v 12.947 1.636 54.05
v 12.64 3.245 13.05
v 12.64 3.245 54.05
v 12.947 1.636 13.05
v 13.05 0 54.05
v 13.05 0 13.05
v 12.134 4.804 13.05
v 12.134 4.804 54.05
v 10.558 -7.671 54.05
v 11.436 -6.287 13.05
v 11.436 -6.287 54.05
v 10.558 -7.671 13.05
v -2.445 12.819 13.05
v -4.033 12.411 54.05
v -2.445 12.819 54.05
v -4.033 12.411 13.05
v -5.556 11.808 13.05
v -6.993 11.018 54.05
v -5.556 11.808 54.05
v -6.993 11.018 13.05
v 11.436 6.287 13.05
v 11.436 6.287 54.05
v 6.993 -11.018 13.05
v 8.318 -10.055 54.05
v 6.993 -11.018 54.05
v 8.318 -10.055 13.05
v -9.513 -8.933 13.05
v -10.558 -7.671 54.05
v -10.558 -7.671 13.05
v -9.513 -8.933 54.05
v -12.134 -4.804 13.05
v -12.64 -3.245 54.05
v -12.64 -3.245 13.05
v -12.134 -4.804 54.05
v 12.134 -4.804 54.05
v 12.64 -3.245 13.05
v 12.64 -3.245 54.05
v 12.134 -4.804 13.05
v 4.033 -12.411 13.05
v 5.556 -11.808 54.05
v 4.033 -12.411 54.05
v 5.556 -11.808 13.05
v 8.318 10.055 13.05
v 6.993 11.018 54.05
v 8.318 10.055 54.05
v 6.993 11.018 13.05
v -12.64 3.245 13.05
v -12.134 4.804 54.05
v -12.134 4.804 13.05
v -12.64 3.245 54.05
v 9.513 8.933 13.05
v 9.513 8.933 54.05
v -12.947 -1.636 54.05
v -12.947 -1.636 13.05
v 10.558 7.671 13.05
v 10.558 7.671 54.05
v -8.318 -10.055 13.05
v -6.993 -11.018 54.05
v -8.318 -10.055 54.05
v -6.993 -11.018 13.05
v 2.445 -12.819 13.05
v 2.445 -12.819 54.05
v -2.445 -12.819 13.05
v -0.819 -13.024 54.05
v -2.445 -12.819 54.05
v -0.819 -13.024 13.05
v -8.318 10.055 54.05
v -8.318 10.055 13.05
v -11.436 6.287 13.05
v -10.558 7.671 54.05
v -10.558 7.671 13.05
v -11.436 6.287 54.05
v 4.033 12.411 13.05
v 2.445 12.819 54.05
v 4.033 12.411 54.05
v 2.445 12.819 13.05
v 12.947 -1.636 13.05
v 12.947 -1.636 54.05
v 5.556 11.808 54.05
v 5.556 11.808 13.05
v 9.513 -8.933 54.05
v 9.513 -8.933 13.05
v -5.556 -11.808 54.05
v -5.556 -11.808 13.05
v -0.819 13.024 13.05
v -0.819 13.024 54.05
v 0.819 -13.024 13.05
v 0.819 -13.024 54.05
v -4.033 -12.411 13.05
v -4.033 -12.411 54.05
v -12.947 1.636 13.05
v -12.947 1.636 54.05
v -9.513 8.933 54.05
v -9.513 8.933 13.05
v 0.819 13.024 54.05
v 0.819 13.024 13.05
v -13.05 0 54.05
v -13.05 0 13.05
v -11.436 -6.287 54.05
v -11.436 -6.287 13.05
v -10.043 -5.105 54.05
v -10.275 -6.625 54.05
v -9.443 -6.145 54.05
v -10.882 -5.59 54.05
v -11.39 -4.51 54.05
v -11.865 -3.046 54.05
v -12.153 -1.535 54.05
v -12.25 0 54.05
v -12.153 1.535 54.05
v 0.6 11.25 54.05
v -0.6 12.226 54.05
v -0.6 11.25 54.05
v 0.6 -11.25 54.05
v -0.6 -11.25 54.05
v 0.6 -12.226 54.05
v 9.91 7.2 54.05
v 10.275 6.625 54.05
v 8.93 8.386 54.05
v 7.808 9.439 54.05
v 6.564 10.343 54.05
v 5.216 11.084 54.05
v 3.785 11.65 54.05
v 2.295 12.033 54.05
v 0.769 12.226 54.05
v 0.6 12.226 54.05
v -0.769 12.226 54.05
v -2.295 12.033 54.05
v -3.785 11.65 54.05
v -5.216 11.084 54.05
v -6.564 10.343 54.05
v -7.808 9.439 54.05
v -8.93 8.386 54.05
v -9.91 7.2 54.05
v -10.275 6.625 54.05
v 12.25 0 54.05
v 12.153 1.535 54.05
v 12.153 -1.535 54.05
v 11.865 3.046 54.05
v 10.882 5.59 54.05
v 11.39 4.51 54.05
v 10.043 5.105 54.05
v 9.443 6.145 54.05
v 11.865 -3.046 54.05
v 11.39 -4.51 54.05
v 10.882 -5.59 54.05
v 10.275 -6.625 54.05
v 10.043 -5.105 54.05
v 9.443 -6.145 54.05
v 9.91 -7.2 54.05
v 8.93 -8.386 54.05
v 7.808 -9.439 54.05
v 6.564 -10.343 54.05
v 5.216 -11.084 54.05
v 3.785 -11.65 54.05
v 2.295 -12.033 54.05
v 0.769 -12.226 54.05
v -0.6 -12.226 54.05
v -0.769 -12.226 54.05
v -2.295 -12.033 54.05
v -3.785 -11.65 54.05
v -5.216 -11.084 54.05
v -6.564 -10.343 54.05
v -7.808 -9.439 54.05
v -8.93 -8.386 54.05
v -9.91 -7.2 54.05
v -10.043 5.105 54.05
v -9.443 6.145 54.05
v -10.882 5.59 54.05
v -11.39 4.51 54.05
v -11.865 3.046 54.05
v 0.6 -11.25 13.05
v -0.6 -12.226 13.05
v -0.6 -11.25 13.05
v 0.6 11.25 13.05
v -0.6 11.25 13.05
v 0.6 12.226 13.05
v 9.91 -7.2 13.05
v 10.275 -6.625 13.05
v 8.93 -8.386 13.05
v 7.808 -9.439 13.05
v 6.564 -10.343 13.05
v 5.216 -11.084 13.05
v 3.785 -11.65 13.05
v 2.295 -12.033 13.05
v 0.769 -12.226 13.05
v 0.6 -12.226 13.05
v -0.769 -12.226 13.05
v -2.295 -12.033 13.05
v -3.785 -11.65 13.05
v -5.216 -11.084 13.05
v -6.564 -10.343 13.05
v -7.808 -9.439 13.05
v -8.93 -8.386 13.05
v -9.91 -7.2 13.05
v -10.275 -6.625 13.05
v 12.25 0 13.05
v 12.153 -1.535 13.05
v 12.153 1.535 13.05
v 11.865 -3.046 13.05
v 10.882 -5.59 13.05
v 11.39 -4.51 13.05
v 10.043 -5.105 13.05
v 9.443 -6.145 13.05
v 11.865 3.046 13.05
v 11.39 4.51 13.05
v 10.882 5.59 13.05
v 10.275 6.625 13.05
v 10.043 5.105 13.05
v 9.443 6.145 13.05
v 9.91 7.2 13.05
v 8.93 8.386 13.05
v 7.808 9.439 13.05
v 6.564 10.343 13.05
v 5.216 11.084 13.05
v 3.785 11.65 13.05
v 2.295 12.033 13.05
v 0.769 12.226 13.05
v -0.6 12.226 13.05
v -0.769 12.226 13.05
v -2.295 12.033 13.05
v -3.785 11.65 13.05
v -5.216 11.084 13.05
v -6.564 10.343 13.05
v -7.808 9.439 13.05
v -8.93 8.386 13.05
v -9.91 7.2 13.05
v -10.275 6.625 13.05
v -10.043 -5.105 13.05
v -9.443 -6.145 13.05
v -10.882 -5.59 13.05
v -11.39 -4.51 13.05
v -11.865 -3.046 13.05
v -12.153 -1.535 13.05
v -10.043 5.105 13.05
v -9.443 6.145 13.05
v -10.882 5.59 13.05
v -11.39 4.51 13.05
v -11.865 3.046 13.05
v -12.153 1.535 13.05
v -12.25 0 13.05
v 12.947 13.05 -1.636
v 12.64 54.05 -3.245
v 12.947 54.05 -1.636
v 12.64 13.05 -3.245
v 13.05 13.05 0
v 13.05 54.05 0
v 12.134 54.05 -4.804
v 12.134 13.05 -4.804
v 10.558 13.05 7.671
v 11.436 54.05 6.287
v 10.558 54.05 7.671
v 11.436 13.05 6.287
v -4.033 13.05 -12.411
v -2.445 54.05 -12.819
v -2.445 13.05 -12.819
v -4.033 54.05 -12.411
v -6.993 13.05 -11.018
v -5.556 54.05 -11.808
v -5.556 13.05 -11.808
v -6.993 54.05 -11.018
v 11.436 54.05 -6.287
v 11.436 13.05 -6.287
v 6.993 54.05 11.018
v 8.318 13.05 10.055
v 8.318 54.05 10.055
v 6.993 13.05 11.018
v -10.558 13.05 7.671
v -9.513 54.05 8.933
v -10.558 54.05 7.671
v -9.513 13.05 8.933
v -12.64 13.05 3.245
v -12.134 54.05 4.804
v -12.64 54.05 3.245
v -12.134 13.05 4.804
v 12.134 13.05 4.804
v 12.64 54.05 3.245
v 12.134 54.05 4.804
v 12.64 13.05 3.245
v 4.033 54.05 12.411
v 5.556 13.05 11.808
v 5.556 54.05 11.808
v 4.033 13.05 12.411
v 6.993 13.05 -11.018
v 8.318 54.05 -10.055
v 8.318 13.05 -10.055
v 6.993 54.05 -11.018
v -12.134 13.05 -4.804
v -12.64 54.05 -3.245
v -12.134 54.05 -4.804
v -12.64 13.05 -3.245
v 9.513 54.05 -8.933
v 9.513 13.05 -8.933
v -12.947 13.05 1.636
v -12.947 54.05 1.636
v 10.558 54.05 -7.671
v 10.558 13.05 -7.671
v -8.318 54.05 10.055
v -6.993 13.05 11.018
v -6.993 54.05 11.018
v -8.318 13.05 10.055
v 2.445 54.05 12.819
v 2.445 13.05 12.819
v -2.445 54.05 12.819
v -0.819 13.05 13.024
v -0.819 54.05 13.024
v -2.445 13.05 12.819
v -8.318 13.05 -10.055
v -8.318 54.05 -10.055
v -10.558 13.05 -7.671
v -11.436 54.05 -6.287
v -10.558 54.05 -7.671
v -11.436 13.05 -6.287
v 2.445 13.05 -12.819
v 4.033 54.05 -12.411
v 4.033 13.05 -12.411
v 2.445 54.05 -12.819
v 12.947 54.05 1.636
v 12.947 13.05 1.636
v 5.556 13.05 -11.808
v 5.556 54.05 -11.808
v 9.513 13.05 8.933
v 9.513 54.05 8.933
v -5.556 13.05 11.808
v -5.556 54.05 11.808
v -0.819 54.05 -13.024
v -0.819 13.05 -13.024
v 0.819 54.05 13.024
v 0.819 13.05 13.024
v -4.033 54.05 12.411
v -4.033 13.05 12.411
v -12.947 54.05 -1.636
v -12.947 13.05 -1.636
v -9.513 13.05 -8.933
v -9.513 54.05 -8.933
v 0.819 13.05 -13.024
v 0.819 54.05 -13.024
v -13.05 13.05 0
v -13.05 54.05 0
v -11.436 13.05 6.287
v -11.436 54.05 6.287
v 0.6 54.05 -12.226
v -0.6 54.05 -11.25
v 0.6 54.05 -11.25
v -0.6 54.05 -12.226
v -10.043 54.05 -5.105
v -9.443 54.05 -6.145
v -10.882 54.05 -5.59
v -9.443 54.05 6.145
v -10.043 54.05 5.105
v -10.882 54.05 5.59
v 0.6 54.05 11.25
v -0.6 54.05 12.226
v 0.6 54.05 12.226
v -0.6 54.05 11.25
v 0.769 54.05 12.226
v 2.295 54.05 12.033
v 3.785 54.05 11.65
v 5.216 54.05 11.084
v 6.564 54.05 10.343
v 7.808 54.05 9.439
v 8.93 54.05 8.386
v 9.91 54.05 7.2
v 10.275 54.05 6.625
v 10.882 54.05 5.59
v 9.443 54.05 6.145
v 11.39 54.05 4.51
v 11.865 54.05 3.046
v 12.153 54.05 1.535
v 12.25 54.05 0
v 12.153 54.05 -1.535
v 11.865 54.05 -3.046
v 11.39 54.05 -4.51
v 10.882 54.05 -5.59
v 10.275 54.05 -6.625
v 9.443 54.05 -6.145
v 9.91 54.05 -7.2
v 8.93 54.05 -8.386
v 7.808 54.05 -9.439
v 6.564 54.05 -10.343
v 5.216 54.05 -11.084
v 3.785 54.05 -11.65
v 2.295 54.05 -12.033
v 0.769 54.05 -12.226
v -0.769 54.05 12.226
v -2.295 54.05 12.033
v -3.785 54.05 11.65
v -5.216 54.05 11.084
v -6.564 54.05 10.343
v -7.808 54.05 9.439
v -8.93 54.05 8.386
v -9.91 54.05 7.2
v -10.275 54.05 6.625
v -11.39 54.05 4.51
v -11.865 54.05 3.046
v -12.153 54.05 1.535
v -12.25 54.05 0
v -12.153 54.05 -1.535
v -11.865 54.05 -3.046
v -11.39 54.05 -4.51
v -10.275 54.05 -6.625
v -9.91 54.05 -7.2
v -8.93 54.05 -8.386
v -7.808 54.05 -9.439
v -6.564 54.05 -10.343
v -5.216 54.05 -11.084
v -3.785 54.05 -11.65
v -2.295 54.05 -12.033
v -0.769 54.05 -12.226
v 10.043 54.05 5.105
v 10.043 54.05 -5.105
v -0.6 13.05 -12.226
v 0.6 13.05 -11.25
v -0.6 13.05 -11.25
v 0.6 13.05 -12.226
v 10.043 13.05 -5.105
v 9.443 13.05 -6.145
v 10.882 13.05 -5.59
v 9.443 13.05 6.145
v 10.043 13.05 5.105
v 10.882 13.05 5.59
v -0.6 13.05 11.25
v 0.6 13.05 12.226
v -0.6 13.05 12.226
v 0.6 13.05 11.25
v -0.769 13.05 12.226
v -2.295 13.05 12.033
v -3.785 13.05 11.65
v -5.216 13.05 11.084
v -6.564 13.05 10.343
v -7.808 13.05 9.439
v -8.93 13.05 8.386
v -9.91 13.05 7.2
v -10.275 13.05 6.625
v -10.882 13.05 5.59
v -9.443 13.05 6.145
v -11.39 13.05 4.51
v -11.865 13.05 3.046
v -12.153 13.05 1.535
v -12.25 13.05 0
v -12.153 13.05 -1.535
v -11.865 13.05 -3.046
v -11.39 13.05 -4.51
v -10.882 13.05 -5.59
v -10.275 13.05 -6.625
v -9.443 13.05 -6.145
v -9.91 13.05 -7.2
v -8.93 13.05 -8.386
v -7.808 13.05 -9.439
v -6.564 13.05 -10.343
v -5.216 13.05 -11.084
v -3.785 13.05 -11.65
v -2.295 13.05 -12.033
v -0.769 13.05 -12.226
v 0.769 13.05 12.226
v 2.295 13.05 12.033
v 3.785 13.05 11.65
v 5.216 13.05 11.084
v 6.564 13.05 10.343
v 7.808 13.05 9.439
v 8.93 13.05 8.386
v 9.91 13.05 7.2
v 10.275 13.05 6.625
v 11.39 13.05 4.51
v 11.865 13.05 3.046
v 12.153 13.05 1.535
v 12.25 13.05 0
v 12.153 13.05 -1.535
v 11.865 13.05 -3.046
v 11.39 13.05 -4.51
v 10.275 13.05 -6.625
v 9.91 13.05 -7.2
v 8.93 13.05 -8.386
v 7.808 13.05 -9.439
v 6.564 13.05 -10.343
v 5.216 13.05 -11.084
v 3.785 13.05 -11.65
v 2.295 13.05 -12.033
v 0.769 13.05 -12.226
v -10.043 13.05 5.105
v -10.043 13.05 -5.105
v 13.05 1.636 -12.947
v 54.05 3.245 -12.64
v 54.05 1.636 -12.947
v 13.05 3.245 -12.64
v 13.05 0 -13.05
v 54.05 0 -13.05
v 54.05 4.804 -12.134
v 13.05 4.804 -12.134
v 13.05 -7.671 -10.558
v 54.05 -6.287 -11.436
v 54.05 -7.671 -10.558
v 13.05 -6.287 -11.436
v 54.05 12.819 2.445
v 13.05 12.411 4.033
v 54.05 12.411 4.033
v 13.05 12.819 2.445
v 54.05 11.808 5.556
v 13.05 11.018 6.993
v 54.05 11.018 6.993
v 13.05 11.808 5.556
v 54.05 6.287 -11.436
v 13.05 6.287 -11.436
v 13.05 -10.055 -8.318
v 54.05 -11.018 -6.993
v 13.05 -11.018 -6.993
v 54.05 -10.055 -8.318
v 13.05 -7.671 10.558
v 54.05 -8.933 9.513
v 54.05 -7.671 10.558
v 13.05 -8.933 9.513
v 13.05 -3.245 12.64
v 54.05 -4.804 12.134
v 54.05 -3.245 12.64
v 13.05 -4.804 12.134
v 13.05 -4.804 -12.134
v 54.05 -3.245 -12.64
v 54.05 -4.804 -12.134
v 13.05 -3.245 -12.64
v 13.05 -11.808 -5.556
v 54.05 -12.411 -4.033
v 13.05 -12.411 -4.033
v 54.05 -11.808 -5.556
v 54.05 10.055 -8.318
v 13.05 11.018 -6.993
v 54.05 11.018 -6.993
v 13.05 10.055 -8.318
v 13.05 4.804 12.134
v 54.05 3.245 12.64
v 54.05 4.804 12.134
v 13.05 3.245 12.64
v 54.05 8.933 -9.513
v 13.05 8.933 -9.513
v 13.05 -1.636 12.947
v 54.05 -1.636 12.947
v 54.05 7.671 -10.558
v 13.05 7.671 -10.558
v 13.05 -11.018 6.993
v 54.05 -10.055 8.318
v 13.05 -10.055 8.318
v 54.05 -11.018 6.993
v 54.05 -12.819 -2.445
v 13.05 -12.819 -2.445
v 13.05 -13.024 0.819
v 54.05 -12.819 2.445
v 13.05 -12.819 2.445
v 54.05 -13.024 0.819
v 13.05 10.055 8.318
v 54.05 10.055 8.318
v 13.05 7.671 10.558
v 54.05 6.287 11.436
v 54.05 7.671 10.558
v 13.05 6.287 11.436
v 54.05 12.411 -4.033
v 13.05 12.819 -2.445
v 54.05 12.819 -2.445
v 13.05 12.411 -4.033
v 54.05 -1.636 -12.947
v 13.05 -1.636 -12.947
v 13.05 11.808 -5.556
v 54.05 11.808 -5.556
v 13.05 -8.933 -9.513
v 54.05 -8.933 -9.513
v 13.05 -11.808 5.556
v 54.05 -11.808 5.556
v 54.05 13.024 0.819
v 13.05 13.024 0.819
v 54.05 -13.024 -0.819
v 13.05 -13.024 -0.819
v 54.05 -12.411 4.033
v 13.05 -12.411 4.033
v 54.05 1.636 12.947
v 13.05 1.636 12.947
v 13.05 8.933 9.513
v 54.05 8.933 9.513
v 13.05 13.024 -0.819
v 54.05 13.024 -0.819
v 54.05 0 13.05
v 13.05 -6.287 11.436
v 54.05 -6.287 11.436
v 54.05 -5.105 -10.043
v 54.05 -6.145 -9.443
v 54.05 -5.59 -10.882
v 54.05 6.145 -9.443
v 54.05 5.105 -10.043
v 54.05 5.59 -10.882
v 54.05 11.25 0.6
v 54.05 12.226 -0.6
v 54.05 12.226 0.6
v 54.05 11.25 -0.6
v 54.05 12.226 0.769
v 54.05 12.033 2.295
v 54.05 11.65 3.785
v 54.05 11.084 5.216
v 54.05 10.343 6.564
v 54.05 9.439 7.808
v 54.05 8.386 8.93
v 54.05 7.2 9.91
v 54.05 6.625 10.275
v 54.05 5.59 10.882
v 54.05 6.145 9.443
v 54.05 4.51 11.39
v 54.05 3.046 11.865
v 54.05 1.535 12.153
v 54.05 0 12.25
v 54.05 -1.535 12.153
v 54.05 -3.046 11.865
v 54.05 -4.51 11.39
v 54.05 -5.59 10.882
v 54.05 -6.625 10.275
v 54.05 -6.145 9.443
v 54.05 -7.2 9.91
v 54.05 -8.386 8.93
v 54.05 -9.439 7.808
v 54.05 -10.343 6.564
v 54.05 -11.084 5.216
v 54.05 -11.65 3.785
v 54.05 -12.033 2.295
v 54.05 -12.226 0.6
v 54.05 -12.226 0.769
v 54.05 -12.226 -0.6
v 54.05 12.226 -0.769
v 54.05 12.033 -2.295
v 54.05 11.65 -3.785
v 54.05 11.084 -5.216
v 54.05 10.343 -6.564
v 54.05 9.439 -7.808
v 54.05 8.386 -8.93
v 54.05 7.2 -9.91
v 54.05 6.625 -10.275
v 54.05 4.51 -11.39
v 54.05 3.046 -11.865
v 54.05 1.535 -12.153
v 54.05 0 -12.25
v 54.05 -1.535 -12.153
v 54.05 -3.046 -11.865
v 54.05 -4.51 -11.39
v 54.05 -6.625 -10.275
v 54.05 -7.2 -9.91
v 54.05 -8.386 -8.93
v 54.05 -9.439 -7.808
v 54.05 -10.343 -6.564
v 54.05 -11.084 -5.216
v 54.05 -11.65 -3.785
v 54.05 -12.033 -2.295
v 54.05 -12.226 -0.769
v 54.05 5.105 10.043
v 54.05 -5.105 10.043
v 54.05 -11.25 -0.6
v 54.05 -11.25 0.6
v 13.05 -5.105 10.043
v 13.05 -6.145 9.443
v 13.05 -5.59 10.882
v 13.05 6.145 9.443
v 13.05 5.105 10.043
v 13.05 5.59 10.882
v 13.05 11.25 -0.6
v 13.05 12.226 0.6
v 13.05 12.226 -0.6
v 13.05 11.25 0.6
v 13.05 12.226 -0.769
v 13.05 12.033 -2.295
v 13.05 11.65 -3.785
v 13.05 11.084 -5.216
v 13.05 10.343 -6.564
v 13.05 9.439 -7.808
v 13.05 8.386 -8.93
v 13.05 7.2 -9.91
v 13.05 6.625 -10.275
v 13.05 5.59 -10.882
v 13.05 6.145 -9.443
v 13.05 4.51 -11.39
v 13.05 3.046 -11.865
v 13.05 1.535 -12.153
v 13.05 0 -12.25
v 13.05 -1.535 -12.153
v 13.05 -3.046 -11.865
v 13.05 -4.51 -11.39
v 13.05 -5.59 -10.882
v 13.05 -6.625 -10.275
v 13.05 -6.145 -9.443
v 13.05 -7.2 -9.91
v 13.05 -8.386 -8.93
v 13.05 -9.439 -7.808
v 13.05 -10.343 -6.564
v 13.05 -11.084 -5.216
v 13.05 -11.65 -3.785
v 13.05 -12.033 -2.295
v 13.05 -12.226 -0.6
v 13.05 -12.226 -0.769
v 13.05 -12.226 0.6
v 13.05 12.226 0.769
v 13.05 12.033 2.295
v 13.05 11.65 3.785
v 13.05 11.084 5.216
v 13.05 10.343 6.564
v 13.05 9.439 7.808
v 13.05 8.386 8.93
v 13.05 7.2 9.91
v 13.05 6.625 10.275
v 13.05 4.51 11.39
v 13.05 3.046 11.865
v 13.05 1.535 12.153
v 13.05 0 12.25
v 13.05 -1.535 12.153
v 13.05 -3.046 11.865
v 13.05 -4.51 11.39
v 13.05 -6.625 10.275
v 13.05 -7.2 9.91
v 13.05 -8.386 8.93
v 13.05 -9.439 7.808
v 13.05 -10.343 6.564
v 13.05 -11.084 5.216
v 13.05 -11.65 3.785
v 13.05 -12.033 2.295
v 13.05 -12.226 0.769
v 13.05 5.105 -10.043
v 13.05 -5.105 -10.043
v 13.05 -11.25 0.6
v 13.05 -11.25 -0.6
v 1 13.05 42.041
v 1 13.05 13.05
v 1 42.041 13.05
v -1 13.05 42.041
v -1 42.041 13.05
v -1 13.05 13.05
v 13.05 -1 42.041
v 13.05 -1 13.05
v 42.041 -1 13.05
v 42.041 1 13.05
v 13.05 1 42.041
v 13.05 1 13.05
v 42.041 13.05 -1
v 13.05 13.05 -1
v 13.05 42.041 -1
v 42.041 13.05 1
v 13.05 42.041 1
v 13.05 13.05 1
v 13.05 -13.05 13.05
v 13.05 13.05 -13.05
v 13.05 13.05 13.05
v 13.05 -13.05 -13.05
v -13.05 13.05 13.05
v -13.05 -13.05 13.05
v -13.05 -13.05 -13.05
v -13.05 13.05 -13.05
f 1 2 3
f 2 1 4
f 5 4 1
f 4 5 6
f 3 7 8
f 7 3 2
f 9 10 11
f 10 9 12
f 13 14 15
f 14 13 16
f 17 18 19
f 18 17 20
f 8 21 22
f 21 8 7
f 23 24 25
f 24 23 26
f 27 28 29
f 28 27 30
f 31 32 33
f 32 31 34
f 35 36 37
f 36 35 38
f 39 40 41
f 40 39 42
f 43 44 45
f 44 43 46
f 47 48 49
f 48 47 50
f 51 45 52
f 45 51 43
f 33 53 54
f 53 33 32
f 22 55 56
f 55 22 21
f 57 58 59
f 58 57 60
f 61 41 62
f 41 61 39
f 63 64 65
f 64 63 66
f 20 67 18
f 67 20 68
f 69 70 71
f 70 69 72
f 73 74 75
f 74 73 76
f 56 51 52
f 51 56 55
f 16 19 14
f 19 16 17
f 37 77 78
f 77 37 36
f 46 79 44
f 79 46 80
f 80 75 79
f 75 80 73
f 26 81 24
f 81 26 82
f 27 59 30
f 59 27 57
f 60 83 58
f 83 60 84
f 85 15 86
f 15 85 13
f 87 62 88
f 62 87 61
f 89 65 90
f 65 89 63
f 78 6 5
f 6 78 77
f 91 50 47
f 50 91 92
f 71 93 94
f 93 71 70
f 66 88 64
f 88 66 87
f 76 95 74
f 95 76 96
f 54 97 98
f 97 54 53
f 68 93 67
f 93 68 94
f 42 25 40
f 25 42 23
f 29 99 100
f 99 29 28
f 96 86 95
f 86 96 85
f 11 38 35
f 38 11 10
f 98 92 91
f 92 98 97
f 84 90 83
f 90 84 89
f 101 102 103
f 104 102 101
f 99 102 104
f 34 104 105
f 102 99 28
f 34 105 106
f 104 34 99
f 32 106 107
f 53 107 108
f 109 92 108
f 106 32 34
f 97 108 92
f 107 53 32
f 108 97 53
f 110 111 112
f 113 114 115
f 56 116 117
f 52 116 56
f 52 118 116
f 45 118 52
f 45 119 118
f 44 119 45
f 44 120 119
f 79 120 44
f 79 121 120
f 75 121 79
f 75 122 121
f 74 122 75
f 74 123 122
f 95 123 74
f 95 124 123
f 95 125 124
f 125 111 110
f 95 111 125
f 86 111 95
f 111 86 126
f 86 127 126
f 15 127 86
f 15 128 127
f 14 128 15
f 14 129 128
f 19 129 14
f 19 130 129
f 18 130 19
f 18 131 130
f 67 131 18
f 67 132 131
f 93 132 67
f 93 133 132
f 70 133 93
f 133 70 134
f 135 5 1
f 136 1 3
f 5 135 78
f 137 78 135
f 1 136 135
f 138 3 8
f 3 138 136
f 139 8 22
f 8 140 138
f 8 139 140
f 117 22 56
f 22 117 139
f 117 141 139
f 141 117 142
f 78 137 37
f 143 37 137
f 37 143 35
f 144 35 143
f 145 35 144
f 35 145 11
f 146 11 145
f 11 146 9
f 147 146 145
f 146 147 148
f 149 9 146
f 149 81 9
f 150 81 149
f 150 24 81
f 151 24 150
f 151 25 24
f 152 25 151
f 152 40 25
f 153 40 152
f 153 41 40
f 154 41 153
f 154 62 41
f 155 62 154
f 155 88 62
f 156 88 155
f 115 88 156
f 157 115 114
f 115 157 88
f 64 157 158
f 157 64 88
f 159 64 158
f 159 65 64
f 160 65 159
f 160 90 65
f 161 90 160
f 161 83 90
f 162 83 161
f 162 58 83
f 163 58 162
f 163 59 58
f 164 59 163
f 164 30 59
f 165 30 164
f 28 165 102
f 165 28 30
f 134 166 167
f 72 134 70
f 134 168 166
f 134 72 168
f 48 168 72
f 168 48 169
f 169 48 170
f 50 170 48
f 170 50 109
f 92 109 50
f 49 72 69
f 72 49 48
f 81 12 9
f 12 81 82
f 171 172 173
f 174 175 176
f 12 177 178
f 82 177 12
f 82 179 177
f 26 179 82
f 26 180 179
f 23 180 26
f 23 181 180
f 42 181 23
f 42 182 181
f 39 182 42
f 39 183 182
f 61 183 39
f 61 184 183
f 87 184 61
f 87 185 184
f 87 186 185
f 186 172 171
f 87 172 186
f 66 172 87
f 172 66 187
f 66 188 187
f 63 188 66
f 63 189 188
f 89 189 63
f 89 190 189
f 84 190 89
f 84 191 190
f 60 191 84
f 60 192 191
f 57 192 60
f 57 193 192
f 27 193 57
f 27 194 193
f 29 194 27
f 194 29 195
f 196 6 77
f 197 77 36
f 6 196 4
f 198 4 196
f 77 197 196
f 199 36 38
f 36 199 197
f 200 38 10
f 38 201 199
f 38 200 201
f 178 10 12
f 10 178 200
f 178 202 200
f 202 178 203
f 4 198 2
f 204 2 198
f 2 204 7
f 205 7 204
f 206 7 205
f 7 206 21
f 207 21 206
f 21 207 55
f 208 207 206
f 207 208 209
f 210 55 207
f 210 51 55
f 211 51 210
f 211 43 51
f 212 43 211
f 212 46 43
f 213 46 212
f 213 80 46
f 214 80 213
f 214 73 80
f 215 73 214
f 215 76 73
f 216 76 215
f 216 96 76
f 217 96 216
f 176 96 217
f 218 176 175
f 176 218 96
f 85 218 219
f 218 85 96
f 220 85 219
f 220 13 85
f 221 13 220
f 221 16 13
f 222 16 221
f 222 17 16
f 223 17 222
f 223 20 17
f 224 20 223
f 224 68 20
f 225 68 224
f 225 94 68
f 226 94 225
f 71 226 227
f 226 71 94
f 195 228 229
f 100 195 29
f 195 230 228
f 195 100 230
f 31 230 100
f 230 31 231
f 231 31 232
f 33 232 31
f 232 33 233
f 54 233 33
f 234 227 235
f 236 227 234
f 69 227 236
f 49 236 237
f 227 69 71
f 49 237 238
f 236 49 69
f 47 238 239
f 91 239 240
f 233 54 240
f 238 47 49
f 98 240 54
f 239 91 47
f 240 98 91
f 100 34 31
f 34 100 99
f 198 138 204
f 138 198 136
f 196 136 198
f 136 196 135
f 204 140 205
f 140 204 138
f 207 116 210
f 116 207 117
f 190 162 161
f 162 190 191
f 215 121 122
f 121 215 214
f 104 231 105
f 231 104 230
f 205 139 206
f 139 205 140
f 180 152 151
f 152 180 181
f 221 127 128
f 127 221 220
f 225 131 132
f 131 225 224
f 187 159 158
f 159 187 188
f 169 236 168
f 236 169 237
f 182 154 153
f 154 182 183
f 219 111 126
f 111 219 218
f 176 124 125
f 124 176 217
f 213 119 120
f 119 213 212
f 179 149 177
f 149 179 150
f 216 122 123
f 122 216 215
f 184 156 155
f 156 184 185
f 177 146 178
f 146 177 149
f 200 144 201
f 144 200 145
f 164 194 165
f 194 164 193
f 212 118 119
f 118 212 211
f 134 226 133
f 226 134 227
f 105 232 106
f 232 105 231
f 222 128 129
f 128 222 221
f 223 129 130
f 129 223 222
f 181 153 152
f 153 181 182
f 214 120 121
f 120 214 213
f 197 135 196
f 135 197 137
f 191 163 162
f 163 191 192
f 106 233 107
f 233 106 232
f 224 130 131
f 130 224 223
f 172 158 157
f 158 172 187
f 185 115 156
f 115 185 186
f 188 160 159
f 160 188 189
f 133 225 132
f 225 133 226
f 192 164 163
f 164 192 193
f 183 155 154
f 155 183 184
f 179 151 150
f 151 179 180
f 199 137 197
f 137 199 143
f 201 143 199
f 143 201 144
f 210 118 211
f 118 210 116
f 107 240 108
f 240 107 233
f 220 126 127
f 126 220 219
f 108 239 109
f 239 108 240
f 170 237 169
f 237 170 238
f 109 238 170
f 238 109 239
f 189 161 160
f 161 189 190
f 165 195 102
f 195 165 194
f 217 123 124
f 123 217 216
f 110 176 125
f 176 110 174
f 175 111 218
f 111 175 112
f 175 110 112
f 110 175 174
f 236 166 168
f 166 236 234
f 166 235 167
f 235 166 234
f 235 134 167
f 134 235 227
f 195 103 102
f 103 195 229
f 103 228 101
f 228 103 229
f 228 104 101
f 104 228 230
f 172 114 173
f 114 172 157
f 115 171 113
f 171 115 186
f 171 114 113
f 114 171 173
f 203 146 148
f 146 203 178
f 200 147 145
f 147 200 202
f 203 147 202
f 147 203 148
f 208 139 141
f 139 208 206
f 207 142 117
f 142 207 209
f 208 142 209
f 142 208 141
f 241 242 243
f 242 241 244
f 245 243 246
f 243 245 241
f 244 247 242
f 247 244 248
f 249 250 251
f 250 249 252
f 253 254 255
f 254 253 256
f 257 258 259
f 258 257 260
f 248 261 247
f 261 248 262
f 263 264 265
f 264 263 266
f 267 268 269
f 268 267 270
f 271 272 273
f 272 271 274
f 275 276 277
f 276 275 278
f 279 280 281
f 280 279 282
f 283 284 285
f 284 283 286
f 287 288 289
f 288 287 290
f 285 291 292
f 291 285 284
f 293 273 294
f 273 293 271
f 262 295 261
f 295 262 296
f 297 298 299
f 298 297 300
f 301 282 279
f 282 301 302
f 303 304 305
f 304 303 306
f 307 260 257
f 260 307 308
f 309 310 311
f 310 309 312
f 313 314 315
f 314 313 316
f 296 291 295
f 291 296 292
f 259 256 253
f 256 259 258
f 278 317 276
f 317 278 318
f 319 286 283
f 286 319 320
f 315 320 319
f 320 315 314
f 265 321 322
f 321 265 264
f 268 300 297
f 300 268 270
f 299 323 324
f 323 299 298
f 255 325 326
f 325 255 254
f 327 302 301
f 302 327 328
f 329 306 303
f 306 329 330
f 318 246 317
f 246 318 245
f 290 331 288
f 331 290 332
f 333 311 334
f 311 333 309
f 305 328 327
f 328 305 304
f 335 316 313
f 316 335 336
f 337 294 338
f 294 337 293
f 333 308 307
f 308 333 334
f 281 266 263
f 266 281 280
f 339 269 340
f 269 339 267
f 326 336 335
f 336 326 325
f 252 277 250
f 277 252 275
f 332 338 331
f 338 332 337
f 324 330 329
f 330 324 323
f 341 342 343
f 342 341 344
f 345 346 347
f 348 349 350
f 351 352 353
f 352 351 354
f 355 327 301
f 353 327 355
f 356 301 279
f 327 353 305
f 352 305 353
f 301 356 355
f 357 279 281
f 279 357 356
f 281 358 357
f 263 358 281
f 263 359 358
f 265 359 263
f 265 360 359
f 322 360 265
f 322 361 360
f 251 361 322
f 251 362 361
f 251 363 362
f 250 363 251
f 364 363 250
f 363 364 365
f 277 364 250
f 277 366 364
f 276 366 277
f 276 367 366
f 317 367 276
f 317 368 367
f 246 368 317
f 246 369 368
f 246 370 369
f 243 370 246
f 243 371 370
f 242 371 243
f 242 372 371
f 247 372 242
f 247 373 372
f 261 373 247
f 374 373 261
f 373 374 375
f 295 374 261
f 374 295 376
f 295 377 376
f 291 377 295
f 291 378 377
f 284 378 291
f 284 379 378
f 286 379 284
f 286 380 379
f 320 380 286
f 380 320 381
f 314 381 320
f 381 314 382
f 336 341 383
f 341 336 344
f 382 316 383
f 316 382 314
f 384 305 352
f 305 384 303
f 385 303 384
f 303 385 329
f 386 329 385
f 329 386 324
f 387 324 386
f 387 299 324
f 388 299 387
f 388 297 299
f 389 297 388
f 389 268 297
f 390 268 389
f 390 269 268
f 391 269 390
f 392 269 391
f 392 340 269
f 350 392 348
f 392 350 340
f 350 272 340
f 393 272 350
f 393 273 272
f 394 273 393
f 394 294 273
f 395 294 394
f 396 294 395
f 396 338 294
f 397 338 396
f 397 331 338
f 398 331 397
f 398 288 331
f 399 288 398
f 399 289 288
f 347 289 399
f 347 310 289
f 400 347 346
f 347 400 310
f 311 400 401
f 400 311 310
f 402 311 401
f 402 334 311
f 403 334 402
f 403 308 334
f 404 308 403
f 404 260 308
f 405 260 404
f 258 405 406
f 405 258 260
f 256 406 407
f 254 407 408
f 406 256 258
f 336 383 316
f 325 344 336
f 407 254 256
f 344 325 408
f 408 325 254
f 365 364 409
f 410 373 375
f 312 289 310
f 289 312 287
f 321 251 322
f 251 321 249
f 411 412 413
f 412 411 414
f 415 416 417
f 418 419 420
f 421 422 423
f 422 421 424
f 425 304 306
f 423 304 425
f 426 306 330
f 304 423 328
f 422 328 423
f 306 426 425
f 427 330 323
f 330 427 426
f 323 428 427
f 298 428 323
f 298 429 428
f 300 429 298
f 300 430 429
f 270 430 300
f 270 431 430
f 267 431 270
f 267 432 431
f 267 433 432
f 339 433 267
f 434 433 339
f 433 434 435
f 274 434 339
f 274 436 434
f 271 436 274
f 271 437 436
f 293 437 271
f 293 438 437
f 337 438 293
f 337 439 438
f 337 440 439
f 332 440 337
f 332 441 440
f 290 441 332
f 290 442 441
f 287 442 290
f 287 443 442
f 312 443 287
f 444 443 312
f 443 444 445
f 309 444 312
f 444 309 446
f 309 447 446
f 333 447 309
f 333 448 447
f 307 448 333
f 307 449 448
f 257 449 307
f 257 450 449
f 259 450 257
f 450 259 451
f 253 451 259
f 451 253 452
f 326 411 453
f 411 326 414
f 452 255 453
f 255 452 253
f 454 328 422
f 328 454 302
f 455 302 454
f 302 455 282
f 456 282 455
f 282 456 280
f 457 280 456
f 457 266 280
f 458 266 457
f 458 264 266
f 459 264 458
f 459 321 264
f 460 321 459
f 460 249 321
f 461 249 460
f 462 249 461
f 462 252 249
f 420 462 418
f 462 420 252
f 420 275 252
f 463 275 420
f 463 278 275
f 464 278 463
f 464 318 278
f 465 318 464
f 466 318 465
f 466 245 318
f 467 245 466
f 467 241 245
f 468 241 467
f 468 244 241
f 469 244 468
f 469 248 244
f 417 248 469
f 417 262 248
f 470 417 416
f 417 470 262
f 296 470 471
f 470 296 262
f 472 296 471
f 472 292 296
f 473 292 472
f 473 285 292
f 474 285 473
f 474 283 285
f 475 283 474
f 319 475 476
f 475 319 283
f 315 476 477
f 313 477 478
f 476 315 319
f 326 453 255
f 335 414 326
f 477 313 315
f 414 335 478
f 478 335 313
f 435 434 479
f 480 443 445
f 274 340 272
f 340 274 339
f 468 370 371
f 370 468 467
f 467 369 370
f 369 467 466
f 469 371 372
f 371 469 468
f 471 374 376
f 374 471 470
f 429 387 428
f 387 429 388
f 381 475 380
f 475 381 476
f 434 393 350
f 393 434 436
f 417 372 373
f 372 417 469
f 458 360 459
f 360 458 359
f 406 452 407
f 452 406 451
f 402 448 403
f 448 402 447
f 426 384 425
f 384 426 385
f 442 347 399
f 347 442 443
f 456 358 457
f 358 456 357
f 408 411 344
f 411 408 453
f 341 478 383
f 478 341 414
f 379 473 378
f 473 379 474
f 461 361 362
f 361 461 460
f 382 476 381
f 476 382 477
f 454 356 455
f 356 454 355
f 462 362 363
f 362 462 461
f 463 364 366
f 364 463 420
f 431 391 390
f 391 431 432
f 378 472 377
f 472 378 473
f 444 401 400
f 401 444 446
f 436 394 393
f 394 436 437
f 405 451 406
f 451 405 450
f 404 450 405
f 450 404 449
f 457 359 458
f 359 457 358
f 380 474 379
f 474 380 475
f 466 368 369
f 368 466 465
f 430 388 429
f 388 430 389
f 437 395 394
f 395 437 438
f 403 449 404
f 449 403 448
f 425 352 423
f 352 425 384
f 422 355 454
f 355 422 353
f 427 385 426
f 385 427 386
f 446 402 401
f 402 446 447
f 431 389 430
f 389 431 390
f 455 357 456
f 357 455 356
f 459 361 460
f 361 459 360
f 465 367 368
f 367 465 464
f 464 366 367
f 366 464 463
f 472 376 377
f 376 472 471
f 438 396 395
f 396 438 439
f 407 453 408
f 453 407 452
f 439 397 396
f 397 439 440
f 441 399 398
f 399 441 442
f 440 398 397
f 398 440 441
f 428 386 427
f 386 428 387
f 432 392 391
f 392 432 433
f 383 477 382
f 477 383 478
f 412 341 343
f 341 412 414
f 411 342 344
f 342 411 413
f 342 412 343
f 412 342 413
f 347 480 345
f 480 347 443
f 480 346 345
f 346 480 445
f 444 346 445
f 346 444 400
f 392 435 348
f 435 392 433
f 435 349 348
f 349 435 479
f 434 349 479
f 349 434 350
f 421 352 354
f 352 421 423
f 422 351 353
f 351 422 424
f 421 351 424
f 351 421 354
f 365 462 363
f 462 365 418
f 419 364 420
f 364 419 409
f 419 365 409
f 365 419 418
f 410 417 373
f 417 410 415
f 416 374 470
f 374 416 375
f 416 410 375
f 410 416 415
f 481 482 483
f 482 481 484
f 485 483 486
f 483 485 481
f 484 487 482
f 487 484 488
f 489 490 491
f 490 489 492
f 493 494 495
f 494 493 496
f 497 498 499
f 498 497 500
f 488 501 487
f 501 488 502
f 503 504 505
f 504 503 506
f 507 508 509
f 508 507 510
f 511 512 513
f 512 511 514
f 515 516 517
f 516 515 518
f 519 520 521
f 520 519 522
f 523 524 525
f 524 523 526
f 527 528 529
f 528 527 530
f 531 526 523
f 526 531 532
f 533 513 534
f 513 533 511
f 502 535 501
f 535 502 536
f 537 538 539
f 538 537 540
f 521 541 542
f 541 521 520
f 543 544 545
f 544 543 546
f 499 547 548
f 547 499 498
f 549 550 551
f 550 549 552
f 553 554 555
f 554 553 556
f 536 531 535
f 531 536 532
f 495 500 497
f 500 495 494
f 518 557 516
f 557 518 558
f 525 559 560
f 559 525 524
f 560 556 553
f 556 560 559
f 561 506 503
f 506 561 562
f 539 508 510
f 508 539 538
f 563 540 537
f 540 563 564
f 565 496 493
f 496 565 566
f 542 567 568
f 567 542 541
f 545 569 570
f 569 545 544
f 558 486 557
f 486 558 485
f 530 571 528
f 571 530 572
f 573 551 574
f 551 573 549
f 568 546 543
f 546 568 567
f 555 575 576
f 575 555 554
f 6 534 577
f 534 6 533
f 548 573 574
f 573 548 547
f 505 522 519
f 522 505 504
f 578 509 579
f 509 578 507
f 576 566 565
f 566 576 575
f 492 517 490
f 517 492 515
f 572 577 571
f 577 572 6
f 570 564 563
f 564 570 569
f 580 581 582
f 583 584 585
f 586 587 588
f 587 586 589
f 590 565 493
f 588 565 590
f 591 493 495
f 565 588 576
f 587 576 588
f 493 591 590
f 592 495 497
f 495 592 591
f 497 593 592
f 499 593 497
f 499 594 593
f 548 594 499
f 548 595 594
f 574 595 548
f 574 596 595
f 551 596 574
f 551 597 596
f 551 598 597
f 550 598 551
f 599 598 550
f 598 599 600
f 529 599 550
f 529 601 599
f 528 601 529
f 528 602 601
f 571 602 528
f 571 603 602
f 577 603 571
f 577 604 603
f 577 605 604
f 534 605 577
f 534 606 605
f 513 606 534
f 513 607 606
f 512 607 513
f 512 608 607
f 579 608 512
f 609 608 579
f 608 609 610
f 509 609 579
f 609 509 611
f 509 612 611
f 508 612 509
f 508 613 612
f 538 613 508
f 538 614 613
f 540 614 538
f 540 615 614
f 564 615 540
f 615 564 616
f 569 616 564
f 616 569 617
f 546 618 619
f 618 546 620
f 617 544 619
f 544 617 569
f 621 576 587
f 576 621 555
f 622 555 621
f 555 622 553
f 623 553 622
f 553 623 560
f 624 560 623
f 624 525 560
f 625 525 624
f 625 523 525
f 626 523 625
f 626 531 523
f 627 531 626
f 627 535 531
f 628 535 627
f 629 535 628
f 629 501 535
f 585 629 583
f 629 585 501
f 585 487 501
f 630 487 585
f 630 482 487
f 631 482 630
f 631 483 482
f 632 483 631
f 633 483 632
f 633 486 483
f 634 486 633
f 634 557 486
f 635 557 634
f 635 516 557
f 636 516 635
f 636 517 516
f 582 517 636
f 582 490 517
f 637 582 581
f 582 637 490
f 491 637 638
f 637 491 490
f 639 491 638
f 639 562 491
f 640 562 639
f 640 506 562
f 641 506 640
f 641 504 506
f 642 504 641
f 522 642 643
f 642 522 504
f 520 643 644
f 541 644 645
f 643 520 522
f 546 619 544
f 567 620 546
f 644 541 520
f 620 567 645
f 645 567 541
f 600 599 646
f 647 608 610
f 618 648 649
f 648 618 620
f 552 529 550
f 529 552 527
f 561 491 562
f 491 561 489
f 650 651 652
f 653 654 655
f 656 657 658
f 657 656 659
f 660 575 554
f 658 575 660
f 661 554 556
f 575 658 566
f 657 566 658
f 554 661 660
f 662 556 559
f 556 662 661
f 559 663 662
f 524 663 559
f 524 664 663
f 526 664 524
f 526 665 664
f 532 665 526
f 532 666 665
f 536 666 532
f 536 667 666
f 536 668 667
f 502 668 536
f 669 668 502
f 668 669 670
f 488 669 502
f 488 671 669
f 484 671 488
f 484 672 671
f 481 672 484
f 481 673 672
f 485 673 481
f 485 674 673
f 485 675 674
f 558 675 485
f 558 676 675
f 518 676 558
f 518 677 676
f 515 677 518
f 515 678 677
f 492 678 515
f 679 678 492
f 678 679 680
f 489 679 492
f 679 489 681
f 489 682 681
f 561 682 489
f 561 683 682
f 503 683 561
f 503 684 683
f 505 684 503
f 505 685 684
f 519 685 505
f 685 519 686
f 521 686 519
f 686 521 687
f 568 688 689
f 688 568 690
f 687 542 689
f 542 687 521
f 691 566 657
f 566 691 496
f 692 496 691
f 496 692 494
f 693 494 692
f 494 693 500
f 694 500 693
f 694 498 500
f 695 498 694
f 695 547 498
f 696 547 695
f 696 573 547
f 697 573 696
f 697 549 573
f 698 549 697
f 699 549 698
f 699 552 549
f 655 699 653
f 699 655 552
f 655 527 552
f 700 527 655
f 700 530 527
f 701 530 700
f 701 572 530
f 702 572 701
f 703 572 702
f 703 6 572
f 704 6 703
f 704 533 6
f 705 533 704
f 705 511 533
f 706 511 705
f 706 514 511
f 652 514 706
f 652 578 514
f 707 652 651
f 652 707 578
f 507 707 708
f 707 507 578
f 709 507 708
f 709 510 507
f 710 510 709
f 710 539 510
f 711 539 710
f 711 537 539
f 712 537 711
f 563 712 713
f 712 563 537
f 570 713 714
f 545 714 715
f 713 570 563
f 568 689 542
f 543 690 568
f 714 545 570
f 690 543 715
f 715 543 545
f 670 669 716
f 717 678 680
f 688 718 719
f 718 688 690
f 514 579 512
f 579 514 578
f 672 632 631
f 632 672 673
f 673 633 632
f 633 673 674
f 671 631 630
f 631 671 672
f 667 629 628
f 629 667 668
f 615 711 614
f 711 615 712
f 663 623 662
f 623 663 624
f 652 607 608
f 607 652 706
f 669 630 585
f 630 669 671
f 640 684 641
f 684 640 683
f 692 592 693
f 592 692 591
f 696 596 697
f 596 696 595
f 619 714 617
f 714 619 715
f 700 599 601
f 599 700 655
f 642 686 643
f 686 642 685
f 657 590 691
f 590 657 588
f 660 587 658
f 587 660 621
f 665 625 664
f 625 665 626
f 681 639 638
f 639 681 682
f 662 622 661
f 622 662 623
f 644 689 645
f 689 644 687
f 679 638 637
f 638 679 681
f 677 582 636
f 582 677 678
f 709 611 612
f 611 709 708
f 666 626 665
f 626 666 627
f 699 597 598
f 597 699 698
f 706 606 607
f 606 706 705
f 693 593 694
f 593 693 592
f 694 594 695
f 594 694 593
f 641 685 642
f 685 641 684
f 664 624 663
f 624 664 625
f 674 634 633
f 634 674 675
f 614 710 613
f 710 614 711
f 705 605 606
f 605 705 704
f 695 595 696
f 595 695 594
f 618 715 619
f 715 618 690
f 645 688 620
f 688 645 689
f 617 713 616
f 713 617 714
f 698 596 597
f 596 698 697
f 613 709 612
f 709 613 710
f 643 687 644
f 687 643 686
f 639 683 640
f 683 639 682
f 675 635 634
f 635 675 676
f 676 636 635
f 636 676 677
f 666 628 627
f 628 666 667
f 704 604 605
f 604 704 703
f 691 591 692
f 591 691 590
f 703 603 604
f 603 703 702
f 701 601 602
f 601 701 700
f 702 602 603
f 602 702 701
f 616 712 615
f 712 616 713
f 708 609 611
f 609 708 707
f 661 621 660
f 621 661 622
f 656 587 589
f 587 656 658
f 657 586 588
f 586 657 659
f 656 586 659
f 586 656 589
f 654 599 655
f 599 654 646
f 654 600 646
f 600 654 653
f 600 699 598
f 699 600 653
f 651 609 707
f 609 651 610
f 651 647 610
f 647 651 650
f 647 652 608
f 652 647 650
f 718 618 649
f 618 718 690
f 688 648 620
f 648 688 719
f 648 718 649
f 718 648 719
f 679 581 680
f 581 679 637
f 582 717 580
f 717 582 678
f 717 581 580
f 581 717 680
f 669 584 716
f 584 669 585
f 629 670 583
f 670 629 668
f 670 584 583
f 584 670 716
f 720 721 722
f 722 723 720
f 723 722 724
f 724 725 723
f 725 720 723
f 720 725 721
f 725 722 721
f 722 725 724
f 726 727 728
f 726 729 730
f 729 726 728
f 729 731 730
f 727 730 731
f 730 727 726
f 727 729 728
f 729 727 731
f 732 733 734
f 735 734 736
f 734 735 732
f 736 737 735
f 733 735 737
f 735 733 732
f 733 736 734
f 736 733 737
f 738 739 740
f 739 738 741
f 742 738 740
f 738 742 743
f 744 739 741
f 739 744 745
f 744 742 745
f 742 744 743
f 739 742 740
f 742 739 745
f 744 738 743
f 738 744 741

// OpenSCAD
// Customisable corner joint for 3 tubes / cylinders by MattKi
// Last updated 04/08/2017
//-------------------------------------------------------------------

height = 41; // length of the cylinders
hole_diameter = 24.5; // the diameter of the hole
wall_thickness = 1.6; // the cylinder wall thickness
brace_thickness = 2; // the thickness of joins between cylinders
use_ribs = true; // do you want ribs on the inside of the cylinders?
rib_count = 6; // the number of internal ribs on the cylinders
rib_width = 1.2; // the width of the internal ribs
rib_depth = 1; // how deep are the internal ribs

//-------------------------------------------------------------------

module tube_main(){
    translate([0,0,height/2+(hole_diameter+wall_thickness)/2]) union(){
        difference(){
            cylinder(h=height, d=hole_diameter+wall_thickness, $fn=50,center=true);
            cylinder(h=height+0.001, d=hole_diameter, $fn=50,center=true);
        }
        for (x=[0:rib_count]){
            rotate([0,0,(360/rib_count)*x]) ribs();
        }
    }
}

module ribs(){
    if (use_ribs){
        translate([0,(hole_diameter-rib_depth)/2,0]) cube([rib_width,rib_depth,height],center=true);
    }
}

module brace(){
    difference(){
        rotate([0,0,45]) cube([height,height,brace_thickness],center=true);
        translate([0,-height*0.5,0]) cube([height*2,height,brace_thickness+0.002],center=true);
        translate([height*0.5,0,0]) cube([height,height*2,brace_thickness+0.002],center=true);
    }
}

cube([hole_diameter+wall_thickness,hole_diameter+wall_thickness,hole_diameter+wall_thickness],center=true);
tube_main();
rotate([-90,0,0]) tube_main();
rotate([0,90,0]) tube_main();
translate([0,(hole_diameter+wall_thickness)/2,(hole_diameter+wall_thickness)/2]) rotate([0,90,0]) brace();
rotate([0,0,-90]) translate([0,(hole_diameter+wall_thickness)/2,(hole_diameter+wall_thickness)/2]) rotate([0,90,0]) brace();
rotate([0,90,0]) translate([0,(hole_diameter+wall_thickness)/2,(hole_diameter+wall_thickness)/2]) rotate([0,90,0]) brace();
